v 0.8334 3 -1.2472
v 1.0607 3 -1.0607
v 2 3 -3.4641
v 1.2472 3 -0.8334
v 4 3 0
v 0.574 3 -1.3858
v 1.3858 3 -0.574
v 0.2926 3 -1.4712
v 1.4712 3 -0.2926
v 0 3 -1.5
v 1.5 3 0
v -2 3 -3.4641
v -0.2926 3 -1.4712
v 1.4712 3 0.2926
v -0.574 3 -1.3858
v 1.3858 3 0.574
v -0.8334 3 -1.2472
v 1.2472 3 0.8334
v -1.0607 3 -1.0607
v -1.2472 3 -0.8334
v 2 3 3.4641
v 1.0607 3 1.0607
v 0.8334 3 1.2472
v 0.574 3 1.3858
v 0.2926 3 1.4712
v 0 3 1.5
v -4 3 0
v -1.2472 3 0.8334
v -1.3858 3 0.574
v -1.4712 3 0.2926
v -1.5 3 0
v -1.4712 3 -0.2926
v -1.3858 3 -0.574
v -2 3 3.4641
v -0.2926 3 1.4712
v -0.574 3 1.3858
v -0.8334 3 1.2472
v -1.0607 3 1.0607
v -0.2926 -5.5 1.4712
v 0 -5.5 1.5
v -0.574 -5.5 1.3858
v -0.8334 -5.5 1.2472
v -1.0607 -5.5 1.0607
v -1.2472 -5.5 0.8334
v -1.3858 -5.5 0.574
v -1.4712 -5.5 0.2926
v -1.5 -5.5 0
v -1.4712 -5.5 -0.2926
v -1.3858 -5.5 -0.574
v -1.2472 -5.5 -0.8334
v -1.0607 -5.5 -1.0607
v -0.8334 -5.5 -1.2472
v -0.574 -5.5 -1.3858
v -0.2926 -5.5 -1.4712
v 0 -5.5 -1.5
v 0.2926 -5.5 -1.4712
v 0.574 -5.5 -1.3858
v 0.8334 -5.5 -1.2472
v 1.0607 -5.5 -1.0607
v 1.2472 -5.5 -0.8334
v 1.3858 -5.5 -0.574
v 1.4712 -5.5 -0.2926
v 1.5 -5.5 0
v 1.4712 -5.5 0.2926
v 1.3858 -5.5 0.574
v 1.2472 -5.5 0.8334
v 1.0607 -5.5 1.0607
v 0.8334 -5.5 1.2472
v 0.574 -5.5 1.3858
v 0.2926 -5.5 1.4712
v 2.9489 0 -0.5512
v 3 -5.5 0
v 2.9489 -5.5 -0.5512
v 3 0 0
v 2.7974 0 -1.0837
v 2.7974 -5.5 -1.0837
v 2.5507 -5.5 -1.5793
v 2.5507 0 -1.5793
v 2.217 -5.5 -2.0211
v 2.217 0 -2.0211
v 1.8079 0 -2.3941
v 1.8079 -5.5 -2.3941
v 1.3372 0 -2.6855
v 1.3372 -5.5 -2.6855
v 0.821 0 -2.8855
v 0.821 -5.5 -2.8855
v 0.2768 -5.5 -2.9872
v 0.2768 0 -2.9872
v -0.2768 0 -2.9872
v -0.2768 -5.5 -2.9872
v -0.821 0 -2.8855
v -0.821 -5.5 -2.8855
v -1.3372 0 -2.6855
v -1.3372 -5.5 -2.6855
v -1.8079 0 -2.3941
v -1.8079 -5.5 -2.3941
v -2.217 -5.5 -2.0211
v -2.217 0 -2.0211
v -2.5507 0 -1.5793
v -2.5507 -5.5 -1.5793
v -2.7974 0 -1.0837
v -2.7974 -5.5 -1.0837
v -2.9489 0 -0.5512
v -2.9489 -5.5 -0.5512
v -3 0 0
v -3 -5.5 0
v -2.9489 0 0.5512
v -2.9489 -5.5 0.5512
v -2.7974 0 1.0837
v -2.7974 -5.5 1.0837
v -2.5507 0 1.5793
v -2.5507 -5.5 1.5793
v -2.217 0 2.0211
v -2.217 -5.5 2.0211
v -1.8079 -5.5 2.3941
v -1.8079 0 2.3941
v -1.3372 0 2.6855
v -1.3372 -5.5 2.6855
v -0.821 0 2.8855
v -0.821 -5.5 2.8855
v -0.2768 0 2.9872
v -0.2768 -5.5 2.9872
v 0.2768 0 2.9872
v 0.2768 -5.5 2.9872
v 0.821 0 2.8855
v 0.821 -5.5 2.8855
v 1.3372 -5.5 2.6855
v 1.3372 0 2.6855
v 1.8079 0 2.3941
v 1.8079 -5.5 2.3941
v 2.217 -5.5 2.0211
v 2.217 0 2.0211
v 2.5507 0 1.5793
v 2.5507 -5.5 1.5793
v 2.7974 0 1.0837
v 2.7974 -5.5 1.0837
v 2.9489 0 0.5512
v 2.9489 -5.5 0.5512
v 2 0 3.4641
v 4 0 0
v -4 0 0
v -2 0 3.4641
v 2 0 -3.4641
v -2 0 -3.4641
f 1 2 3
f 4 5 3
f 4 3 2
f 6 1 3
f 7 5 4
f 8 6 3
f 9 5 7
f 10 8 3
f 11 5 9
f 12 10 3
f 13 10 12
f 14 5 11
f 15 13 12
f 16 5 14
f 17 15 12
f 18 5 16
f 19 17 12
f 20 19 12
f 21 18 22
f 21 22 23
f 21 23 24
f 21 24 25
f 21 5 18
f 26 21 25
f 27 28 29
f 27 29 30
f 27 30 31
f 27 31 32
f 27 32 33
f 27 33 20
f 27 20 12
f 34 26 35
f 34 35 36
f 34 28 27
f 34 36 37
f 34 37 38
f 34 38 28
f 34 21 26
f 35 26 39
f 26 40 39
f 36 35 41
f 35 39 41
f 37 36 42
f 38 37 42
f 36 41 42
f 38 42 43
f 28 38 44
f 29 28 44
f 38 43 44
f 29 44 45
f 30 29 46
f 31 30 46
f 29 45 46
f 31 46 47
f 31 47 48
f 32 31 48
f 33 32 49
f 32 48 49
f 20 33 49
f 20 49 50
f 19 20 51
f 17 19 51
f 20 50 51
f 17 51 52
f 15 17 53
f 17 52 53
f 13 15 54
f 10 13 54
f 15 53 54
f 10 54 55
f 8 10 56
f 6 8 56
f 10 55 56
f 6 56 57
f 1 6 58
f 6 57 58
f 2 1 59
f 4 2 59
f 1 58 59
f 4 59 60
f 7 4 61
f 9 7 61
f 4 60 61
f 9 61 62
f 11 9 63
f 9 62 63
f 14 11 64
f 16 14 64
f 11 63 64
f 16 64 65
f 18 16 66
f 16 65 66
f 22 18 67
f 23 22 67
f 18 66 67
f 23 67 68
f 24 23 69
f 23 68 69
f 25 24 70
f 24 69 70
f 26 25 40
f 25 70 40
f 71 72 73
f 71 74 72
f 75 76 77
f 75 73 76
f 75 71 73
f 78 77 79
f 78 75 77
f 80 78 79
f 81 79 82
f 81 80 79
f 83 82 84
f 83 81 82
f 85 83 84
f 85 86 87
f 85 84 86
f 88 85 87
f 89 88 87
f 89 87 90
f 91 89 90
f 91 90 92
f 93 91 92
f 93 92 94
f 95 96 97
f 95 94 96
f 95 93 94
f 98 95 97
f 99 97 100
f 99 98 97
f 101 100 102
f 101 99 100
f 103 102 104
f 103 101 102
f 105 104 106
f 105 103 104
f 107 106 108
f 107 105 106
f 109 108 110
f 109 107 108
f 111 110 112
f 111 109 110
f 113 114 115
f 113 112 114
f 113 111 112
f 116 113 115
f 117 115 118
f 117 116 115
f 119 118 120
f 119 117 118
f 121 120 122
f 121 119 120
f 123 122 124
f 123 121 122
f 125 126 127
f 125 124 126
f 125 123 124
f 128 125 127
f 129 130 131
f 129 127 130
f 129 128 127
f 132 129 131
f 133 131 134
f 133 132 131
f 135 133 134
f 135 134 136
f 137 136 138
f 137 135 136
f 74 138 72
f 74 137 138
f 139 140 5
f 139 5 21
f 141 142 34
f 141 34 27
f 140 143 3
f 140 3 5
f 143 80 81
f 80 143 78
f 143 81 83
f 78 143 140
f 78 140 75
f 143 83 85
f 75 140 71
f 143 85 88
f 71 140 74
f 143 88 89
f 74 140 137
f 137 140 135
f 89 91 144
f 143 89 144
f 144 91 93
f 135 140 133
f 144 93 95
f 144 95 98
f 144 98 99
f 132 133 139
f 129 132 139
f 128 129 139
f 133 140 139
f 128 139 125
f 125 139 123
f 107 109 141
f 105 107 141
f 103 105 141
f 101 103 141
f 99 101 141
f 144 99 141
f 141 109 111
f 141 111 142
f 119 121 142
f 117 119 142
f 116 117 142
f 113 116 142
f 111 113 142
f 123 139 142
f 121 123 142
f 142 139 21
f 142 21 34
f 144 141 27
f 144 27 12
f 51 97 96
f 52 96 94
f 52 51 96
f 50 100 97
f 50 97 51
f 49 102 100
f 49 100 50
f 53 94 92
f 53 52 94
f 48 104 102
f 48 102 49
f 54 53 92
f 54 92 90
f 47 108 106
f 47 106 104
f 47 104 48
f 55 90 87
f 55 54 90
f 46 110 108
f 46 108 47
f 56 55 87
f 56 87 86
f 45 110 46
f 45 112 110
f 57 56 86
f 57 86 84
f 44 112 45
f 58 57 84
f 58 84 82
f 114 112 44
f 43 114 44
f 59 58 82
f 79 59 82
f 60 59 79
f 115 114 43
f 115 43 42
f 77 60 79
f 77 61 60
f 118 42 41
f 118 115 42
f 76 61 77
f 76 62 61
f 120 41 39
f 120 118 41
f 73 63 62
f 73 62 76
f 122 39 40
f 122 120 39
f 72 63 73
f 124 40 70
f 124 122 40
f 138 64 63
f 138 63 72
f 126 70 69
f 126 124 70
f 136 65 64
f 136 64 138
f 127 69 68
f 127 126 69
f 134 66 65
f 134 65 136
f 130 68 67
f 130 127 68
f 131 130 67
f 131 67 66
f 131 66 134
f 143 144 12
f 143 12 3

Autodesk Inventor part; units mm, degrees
ref_plane "YZ Plane" through (0, 0, 0) normal (1, 0, 0) x (0, 1, 0)
ref_plane "XZ Plane" through (0, 0, 0) normal (0, 1, 0) x (-1, 0, 0)
ref_plane "XY Plane" through (0, 0, 0) normal (0, 0, 1) x (1, 0, 0)
sketch "Sketch1" plane through (0, 0, 0) normal (0, 1, 0) x (-1, 0, 0)
  line L0 (-4, 0) -> (-2, 3.4641)
  line L1 (-2, 3.4641) -> (2, 3.4641)
  line L2 (2, 3.4641) -> (4, 0)
  line L3 (4, 0) -> (2, -3.4641)
  line L4 (2, -3.4641) -> (-2, -3.4641)
  line L5 (-2, -3.4641) -> (-4, 0)
  point P0 (0, 0)
  point P1 (0, 0)
  dimension "d1" = 8
extrude "Extrusion1" add sketch "Sketch1" along normal blind 3
sketch "Sketch2" plane through (0, 0, 0) normal (0, -1, 0) x (1, 0, 0)
  circle A0 centre (0, 0) radius 3
  dimension "d4" = 6
extrude "Extrusion2" add sketch "Sketch2" along normal blind 1
sketch "Sketch3" plane through (0, -1, 0) normal (0, -1, 0) x (1, 0, 0)
  circle A0 centre (0, 0) radius 3 projected
  circle A1 centre (0, 0) radius 3
extrude "Extrusion3" add sketch "Sketch3" along normal blind 4.5
thread "Thread1" size "M6x1" class "6g" standard "ANSI Metric M Profile" length 5.5 offset 1
sketch "Sketch4" plane through (0, 3, 0) normal (0, 1, 0) x (1, 0, 0)
  point P0 (0, 0)
hole "Hole1" at (0, 3, 0) direction (0, -1, 0) diameter 3 end through all
properties material "Brass, Soft Yellow, Welded"
